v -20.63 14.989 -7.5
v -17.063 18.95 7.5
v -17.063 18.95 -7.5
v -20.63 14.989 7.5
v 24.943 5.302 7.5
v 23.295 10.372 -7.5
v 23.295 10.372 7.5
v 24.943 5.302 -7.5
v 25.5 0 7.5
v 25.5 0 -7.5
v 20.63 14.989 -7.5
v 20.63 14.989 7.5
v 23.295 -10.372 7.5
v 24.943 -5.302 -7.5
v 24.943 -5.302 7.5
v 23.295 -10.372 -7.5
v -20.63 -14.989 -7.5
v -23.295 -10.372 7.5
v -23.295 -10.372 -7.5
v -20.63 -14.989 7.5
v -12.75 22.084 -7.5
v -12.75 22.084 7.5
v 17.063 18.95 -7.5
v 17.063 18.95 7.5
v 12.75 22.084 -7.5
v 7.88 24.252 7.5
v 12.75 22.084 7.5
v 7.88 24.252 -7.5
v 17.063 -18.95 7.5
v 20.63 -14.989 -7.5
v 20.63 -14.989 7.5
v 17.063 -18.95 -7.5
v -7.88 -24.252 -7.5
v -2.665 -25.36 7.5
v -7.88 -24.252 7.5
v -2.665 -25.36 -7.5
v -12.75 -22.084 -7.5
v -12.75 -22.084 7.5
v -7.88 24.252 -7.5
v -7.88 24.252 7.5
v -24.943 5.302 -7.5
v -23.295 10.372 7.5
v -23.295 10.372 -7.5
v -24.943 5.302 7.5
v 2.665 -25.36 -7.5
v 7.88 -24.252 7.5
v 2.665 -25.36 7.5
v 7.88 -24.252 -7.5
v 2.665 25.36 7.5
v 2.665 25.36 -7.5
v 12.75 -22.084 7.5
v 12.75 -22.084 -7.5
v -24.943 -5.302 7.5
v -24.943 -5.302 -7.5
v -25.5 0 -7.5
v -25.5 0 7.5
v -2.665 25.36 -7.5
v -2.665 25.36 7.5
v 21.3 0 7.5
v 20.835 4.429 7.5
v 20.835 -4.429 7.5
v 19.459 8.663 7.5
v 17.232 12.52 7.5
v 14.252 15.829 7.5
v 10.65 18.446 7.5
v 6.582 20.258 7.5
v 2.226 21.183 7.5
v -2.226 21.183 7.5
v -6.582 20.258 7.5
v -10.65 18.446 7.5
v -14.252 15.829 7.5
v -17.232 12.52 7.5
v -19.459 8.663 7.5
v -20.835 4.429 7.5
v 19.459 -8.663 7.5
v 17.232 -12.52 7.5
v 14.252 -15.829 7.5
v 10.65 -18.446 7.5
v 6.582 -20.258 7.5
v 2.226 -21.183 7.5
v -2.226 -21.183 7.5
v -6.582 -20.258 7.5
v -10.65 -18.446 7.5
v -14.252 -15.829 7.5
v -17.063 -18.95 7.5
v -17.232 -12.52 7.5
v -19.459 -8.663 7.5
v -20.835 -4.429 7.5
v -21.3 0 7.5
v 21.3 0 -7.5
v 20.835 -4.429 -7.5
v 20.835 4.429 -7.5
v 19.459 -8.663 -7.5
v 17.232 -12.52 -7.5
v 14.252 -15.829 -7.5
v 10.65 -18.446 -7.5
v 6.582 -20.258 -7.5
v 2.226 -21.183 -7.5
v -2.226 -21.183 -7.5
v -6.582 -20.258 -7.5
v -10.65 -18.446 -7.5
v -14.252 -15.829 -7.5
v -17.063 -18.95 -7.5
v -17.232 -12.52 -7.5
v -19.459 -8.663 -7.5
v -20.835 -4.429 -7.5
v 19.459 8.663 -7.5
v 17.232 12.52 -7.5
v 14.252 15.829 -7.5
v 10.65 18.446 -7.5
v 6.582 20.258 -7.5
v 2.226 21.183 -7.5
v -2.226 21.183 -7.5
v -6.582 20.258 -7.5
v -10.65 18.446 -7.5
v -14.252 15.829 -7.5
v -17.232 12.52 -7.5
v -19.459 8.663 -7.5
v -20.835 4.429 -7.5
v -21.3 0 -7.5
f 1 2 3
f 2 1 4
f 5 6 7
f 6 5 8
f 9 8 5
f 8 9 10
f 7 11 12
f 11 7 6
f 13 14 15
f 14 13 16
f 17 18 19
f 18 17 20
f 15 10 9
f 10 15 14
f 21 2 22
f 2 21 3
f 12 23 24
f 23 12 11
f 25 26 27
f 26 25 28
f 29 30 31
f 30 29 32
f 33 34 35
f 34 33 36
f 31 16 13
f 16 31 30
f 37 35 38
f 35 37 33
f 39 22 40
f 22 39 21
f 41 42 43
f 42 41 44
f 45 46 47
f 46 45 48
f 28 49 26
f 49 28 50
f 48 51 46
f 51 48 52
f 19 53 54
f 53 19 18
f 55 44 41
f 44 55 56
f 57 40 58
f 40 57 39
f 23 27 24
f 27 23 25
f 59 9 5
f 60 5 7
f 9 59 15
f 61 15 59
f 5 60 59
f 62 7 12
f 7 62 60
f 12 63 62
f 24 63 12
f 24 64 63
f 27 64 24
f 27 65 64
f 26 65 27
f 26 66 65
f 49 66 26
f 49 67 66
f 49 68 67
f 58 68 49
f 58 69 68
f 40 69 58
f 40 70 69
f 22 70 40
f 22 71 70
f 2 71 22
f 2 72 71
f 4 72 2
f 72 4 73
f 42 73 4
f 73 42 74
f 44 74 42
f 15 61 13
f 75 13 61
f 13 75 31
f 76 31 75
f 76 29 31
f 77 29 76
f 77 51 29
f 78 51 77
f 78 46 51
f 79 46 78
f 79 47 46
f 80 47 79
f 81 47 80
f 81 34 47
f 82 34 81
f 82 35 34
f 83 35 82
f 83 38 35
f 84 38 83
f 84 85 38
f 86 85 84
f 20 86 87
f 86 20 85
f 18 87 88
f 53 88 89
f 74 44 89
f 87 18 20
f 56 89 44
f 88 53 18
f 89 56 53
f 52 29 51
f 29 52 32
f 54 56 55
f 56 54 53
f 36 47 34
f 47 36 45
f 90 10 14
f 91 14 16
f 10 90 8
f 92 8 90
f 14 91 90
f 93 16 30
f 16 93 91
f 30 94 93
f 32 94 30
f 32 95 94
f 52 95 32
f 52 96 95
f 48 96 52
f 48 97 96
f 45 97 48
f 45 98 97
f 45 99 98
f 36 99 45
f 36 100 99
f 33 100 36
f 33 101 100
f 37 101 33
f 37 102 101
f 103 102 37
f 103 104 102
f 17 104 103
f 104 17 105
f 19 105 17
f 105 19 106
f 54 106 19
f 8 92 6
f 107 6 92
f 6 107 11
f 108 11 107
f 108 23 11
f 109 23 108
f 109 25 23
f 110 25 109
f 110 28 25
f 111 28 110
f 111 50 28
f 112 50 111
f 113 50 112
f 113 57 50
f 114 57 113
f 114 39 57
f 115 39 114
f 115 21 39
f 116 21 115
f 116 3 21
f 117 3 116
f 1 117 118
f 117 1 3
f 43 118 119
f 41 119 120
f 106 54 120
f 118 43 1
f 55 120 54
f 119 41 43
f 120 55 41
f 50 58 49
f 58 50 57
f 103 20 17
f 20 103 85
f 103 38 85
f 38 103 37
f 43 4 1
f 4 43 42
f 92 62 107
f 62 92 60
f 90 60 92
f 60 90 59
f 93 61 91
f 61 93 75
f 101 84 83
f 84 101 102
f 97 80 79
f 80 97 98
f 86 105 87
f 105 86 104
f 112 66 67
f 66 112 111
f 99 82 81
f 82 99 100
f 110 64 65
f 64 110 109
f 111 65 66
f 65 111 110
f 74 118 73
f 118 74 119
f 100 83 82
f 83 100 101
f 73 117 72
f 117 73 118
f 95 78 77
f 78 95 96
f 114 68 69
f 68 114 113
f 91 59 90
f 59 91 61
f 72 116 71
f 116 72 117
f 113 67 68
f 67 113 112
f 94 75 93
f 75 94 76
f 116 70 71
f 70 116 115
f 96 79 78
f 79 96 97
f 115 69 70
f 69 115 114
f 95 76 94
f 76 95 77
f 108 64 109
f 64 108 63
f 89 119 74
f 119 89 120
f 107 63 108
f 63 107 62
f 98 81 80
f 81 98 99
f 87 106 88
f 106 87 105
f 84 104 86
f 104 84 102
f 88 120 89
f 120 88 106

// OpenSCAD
difference(){
	union()
	{
	cylinder(r=25.5,h=15,center=true);
	//translate([0,0,-8.5])cylinder(r=27.5,h=1);	//limec
	}

	cylinder(r=21.3,h=18,center=true);
	
}
